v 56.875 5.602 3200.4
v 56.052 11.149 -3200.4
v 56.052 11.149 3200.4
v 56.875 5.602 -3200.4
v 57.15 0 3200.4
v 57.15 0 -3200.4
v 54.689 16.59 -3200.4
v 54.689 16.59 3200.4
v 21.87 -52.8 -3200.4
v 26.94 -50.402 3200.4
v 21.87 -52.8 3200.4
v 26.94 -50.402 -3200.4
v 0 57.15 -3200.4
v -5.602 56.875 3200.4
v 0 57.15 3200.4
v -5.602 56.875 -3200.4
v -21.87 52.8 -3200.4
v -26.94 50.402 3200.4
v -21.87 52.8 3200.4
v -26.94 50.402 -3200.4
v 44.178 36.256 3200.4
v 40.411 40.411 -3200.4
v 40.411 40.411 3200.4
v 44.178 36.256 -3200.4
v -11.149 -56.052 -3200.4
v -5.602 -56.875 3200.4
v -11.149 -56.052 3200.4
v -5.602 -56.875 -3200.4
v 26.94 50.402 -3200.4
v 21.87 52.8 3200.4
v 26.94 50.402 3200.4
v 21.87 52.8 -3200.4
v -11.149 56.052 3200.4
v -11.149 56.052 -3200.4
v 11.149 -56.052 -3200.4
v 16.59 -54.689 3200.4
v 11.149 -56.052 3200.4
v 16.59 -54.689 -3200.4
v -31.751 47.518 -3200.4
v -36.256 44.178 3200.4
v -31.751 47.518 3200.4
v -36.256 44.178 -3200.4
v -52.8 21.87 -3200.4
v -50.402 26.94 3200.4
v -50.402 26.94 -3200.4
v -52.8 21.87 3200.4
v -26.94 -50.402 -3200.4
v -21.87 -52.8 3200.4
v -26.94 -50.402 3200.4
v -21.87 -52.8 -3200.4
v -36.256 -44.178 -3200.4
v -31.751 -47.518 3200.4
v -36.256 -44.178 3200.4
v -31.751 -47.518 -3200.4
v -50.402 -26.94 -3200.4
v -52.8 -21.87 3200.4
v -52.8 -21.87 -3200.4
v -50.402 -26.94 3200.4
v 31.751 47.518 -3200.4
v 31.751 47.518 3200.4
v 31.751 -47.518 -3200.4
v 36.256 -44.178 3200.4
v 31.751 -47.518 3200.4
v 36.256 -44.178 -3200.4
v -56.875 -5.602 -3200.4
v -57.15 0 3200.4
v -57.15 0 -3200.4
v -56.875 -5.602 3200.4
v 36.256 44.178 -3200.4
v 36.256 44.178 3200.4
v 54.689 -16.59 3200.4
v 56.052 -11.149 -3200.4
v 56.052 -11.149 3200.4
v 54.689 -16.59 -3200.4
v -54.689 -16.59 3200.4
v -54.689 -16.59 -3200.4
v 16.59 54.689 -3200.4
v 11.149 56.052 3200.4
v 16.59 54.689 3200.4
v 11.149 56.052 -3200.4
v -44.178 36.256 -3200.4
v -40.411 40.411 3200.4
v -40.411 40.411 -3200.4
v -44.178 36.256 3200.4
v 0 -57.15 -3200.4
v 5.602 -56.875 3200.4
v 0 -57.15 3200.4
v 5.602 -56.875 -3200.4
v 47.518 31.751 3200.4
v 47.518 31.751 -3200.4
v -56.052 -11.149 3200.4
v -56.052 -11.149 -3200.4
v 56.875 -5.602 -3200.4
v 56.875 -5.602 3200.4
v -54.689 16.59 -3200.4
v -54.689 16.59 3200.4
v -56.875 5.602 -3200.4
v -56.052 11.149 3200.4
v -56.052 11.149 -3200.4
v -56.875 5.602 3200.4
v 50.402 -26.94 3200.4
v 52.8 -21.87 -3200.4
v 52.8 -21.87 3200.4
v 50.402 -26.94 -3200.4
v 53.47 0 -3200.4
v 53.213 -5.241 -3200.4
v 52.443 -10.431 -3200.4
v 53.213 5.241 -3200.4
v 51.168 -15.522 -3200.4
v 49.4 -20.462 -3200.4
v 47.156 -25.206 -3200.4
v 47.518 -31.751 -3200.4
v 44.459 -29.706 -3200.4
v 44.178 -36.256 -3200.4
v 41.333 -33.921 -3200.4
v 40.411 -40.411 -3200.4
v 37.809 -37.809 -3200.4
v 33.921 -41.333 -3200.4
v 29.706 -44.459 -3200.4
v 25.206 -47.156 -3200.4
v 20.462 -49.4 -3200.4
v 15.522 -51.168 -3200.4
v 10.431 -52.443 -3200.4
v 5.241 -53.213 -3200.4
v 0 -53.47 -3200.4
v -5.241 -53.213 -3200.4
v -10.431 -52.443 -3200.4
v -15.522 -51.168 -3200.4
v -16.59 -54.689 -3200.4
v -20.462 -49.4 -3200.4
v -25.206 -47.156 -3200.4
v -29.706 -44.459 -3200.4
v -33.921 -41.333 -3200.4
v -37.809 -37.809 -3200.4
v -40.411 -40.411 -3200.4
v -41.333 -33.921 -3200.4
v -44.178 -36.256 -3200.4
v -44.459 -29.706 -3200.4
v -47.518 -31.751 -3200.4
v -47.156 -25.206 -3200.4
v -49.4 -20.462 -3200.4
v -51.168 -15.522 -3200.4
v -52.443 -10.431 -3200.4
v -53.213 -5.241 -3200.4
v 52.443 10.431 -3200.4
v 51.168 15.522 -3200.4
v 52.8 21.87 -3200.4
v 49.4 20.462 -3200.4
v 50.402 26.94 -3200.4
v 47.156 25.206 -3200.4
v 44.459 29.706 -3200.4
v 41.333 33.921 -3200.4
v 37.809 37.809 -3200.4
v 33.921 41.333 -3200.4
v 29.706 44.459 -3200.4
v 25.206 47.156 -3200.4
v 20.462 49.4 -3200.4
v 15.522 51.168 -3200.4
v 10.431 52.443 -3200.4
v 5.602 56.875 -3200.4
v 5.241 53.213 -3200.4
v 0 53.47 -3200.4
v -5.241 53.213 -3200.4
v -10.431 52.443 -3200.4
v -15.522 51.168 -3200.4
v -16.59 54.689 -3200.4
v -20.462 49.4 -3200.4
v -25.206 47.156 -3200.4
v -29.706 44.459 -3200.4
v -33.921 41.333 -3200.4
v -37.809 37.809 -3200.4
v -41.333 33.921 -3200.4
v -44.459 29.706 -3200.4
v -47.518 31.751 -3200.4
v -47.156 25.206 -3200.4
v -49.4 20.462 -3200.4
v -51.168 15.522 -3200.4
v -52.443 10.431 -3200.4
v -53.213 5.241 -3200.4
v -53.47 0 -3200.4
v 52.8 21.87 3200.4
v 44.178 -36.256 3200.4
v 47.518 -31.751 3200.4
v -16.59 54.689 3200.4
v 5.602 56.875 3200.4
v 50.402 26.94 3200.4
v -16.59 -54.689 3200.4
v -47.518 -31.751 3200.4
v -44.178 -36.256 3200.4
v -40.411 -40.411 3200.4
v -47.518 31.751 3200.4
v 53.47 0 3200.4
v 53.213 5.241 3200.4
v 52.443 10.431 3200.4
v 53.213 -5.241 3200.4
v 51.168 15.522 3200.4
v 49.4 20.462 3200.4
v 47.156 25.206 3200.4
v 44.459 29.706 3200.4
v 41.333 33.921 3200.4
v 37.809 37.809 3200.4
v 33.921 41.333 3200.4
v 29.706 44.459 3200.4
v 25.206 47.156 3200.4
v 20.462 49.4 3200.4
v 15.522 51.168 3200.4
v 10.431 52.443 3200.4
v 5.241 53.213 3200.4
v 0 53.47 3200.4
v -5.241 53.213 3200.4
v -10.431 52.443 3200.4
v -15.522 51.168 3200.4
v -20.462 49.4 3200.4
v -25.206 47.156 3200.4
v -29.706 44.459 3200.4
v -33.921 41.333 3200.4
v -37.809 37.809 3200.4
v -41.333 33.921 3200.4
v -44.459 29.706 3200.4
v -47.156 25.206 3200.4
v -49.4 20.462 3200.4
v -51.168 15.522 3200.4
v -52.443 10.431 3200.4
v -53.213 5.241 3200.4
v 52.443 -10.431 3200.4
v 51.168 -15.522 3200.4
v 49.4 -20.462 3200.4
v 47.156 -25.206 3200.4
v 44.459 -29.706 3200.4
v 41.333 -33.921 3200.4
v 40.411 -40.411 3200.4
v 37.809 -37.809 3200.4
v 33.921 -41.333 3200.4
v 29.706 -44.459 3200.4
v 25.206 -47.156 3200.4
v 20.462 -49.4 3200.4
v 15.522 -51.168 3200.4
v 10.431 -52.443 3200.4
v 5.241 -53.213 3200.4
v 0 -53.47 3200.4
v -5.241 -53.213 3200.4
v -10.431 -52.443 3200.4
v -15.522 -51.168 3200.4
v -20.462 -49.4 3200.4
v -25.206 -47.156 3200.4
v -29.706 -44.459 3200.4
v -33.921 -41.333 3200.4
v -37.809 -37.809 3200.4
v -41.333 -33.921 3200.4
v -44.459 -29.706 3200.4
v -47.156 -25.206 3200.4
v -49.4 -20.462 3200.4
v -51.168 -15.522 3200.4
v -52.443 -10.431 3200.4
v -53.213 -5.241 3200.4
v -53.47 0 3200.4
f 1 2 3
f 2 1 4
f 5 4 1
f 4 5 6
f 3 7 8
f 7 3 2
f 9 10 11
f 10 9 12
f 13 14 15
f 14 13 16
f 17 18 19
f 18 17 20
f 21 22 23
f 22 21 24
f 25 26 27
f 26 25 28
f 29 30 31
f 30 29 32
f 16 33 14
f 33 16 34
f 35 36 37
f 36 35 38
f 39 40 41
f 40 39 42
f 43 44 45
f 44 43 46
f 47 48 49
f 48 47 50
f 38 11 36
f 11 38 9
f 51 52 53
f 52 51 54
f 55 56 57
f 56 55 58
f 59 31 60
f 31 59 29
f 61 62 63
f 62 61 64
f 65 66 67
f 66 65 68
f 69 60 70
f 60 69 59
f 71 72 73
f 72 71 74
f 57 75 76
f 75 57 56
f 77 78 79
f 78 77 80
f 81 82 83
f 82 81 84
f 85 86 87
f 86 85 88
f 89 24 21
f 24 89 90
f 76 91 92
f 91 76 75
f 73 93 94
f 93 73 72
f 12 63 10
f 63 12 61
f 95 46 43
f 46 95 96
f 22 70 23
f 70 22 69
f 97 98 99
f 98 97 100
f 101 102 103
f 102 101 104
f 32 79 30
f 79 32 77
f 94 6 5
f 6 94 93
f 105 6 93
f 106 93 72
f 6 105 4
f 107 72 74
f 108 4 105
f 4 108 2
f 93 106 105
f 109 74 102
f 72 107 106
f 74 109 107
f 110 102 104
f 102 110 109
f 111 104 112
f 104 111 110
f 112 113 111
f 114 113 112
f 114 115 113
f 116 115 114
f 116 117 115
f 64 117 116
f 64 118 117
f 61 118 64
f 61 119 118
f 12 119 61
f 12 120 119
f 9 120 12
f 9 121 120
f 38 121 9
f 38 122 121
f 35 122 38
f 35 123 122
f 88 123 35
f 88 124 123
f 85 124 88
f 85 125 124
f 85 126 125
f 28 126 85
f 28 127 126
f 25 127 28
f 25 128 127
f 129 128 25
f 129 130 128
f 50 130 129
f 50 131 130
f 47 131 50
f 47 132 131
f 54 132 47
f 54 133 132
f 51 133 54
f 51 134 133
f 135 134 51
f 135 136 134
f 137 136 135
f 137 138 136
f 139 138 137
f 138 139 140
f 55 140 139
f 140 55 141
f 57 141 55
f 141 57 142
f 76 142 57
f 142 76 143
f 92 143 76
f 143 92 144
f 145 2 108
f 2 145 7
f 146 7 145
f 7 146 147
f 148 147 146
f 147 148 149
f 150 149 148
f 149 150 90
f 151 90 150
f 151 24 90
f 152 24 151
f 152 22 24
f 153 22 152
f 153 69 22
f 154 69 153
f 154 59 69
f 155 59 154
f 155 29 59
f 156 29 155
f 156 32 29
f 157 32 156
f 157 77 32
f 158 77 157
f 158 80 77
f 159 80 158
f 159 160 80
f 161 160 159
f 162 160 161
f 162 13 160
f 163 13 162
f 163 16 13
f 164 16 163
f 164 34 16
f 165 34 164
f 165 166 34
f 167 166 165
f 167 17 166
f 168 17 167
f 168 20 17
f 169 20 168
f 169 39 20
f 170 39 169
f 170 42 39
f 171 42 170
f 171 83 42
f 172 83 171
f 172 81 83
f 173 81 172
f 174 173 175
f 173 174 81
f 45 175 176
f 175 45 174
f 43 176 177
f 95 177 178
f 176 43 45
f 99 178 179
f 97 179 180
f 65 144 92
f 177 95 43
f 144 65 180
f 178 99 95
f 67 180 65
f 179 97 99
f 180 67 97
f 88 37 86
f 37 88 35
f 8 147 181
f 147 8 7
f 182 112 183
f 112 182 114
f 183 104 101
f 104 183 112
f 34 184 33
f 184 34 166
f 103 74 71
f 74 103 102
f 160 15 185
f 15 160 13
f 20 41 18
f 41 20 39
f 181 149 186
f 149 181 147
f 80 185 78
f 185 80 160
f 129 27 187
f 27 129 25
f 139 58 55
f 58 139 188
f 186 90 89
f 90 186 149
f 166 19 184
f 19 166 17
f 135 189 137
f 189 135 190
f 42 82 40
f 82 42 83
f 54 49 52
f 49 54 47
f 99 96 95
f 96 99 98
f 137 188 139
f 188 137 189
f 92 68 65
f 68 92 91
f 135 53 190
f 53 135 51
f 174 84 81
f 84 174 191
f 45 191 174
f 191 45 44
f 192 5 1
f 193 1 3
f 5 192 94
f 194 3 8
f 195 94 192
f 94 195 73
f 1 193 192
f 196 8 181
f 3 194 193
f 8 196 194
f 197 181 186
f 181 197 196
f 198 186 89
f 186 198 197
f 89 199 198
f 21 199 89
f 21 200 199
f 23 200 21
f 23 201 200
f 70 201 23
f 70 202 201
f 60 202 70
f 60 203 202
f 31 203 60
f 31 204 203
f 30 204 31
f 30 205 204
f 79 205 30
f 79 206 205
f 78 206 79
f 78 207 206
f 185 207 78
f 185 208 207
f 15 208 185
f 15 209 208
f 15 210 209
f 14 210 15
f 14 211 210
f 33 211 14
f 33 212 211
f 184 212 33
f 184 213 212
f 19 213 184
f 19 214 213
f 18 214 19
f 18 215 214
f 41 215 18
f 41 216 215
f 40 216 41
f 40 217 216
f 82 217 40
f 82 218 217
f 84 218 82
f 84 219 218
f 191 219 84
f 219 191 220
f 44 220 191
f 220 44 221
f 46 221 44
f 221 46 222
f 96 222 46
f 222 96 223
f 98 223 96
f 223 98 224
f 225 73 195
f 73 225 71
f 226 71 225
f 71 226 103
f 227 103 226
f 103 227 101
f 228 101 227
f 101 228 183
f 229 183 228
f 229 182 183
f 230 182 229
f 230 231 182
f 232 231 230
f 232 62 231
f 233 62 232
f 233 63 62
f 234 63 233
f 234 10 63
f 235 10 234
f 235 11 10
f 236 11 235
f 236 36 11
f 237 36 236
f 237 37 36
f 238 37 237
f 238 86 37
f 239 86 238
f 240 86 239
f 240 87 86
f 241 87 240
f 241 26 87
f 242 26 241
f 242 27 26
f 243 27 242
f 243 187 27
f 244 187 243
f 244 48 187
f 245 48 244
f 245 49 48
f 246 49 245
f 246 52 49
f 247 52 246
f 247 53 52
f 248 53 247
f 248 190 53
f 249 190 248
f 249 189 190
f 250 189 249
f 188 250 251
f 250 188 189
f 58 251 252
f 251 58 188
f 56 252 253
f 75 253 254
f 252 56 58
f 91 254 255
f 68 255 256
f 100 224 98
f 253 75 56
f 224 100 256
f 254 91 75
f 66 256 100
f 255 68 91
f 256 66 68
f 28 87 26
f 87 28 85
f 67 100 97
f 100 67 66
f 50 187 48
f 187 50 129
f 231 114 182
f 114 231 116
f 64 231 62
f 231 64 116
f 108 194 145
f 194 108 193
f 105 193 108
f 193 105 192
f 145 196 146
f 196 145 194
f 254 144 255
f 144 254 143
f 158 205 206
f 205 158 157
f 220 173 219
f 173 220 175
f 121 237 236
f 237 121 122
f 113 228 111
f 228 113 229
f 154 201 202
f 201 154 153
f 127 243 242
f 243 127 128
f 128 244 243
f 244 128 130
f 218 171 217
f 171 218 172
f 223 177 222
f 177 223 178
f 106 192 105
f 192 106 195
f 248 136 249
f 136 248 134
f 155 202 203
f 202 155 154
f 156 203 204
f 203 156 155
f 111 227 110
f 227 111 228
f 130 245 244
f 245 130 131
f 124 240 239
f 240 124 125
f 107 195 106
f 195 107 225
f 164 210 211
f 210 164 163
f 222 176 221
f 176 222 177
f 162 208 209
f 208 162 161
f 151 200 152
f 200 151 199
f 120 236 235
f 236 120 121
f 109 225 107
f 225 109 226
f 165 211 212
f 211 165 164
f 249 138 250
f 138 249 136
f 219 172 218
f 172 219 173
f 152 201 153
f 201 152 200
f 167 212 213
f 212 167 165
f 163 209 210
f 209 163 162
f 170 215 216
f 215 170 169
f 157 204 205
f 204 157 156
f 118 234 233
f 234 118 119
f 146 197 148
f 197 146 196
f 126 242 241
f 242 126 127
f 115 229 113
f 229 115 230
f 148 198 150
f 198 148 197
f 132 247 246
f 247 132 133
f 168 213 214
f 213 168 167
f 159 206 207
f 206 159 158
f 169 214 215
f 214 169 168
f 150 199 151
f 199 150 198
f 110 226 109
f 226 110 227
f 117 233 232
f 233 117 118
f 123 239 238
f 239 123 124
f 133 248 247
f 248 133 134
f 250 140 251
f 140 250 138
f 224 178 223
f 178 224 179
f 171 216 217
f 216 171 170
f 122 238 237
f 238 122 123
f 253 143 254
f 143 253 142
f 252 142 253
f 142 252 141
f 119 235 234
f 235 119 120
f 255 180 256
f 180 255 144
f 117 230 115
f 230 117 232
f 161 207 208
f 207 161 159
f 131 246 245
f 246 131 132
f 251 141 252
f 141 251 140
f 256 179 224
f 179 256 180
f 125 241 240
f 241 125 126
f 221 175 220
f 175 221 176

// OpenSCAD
// Auto-generated by scripts/author_from_manifest.py (Phase D.3).
// Source: data/phase_d_manifest.json (sku_intent='wheatland-sch10-black-4in-21ft').
// Do not hand-edit — regenerate from the manifest.
//
// @part wheatland_sch10_black_4in_21ft
// @kind pipe_segment
// @category pipe.sch10.black.steel
// @display-name "Sch10 Black Steel 4\" x 21ft"
// @mfg wheatland_tube
// @price-usd 44.00
// @install-minutes 8
// @crew journeyman
// @param size_in number default=4 label="Size" unit="in"
// @port inlet position=[0,0,-0.5] direction=[0,0,-1] style=grooved size_in=4 role=run_a
// @port outlet position=[0,0,0.5] direction=[0,0,1] style=grooved size_in=4 role=run_b

size_in  = 4.0;
length_m = 6.4008;
schedule = "sch10";

function od_mm(nps) =
    nps ==  0.75 ? 26.7 :
    nps ==   1  ? 33.4 :
    nps == 1.25 ? 42.2 :
    nps == 1.5  ? 48.3 :
    nps ==   2  ? 60.3 :
    nps == 2.5  ? 73.0 :
    nps ==   3  ? 88.9 :
    nps ==   4  ? 114.3 :
    nps ==   5  ? 141.3 :
    nps ==   6  ? 168.3 :
    nps ==   8  ? 219.1 :
    nps ==  10  ? 273.0 : 60.3;

function wall_mm(nps, sched) =
    sched == "sch40"
        ? (nps <= 1.5 ? 3.68 : nps <= 3 ? 5.49 : 6.02)
        : (nps <= 1.5 ? 2.77 : nps <= 3 ? 3.05 : 3.68);

od = od_mm(size_in);
id = od - 2 * wall_mm(size_in, schedule);
len_mm = length_m * 1000;

difference() {
    cylinder(h = len_mm, d = od, center = true, $fn = 64);
    cylinder(h = len_mm + 1, d = id, center = true, $fn = 64);
}
